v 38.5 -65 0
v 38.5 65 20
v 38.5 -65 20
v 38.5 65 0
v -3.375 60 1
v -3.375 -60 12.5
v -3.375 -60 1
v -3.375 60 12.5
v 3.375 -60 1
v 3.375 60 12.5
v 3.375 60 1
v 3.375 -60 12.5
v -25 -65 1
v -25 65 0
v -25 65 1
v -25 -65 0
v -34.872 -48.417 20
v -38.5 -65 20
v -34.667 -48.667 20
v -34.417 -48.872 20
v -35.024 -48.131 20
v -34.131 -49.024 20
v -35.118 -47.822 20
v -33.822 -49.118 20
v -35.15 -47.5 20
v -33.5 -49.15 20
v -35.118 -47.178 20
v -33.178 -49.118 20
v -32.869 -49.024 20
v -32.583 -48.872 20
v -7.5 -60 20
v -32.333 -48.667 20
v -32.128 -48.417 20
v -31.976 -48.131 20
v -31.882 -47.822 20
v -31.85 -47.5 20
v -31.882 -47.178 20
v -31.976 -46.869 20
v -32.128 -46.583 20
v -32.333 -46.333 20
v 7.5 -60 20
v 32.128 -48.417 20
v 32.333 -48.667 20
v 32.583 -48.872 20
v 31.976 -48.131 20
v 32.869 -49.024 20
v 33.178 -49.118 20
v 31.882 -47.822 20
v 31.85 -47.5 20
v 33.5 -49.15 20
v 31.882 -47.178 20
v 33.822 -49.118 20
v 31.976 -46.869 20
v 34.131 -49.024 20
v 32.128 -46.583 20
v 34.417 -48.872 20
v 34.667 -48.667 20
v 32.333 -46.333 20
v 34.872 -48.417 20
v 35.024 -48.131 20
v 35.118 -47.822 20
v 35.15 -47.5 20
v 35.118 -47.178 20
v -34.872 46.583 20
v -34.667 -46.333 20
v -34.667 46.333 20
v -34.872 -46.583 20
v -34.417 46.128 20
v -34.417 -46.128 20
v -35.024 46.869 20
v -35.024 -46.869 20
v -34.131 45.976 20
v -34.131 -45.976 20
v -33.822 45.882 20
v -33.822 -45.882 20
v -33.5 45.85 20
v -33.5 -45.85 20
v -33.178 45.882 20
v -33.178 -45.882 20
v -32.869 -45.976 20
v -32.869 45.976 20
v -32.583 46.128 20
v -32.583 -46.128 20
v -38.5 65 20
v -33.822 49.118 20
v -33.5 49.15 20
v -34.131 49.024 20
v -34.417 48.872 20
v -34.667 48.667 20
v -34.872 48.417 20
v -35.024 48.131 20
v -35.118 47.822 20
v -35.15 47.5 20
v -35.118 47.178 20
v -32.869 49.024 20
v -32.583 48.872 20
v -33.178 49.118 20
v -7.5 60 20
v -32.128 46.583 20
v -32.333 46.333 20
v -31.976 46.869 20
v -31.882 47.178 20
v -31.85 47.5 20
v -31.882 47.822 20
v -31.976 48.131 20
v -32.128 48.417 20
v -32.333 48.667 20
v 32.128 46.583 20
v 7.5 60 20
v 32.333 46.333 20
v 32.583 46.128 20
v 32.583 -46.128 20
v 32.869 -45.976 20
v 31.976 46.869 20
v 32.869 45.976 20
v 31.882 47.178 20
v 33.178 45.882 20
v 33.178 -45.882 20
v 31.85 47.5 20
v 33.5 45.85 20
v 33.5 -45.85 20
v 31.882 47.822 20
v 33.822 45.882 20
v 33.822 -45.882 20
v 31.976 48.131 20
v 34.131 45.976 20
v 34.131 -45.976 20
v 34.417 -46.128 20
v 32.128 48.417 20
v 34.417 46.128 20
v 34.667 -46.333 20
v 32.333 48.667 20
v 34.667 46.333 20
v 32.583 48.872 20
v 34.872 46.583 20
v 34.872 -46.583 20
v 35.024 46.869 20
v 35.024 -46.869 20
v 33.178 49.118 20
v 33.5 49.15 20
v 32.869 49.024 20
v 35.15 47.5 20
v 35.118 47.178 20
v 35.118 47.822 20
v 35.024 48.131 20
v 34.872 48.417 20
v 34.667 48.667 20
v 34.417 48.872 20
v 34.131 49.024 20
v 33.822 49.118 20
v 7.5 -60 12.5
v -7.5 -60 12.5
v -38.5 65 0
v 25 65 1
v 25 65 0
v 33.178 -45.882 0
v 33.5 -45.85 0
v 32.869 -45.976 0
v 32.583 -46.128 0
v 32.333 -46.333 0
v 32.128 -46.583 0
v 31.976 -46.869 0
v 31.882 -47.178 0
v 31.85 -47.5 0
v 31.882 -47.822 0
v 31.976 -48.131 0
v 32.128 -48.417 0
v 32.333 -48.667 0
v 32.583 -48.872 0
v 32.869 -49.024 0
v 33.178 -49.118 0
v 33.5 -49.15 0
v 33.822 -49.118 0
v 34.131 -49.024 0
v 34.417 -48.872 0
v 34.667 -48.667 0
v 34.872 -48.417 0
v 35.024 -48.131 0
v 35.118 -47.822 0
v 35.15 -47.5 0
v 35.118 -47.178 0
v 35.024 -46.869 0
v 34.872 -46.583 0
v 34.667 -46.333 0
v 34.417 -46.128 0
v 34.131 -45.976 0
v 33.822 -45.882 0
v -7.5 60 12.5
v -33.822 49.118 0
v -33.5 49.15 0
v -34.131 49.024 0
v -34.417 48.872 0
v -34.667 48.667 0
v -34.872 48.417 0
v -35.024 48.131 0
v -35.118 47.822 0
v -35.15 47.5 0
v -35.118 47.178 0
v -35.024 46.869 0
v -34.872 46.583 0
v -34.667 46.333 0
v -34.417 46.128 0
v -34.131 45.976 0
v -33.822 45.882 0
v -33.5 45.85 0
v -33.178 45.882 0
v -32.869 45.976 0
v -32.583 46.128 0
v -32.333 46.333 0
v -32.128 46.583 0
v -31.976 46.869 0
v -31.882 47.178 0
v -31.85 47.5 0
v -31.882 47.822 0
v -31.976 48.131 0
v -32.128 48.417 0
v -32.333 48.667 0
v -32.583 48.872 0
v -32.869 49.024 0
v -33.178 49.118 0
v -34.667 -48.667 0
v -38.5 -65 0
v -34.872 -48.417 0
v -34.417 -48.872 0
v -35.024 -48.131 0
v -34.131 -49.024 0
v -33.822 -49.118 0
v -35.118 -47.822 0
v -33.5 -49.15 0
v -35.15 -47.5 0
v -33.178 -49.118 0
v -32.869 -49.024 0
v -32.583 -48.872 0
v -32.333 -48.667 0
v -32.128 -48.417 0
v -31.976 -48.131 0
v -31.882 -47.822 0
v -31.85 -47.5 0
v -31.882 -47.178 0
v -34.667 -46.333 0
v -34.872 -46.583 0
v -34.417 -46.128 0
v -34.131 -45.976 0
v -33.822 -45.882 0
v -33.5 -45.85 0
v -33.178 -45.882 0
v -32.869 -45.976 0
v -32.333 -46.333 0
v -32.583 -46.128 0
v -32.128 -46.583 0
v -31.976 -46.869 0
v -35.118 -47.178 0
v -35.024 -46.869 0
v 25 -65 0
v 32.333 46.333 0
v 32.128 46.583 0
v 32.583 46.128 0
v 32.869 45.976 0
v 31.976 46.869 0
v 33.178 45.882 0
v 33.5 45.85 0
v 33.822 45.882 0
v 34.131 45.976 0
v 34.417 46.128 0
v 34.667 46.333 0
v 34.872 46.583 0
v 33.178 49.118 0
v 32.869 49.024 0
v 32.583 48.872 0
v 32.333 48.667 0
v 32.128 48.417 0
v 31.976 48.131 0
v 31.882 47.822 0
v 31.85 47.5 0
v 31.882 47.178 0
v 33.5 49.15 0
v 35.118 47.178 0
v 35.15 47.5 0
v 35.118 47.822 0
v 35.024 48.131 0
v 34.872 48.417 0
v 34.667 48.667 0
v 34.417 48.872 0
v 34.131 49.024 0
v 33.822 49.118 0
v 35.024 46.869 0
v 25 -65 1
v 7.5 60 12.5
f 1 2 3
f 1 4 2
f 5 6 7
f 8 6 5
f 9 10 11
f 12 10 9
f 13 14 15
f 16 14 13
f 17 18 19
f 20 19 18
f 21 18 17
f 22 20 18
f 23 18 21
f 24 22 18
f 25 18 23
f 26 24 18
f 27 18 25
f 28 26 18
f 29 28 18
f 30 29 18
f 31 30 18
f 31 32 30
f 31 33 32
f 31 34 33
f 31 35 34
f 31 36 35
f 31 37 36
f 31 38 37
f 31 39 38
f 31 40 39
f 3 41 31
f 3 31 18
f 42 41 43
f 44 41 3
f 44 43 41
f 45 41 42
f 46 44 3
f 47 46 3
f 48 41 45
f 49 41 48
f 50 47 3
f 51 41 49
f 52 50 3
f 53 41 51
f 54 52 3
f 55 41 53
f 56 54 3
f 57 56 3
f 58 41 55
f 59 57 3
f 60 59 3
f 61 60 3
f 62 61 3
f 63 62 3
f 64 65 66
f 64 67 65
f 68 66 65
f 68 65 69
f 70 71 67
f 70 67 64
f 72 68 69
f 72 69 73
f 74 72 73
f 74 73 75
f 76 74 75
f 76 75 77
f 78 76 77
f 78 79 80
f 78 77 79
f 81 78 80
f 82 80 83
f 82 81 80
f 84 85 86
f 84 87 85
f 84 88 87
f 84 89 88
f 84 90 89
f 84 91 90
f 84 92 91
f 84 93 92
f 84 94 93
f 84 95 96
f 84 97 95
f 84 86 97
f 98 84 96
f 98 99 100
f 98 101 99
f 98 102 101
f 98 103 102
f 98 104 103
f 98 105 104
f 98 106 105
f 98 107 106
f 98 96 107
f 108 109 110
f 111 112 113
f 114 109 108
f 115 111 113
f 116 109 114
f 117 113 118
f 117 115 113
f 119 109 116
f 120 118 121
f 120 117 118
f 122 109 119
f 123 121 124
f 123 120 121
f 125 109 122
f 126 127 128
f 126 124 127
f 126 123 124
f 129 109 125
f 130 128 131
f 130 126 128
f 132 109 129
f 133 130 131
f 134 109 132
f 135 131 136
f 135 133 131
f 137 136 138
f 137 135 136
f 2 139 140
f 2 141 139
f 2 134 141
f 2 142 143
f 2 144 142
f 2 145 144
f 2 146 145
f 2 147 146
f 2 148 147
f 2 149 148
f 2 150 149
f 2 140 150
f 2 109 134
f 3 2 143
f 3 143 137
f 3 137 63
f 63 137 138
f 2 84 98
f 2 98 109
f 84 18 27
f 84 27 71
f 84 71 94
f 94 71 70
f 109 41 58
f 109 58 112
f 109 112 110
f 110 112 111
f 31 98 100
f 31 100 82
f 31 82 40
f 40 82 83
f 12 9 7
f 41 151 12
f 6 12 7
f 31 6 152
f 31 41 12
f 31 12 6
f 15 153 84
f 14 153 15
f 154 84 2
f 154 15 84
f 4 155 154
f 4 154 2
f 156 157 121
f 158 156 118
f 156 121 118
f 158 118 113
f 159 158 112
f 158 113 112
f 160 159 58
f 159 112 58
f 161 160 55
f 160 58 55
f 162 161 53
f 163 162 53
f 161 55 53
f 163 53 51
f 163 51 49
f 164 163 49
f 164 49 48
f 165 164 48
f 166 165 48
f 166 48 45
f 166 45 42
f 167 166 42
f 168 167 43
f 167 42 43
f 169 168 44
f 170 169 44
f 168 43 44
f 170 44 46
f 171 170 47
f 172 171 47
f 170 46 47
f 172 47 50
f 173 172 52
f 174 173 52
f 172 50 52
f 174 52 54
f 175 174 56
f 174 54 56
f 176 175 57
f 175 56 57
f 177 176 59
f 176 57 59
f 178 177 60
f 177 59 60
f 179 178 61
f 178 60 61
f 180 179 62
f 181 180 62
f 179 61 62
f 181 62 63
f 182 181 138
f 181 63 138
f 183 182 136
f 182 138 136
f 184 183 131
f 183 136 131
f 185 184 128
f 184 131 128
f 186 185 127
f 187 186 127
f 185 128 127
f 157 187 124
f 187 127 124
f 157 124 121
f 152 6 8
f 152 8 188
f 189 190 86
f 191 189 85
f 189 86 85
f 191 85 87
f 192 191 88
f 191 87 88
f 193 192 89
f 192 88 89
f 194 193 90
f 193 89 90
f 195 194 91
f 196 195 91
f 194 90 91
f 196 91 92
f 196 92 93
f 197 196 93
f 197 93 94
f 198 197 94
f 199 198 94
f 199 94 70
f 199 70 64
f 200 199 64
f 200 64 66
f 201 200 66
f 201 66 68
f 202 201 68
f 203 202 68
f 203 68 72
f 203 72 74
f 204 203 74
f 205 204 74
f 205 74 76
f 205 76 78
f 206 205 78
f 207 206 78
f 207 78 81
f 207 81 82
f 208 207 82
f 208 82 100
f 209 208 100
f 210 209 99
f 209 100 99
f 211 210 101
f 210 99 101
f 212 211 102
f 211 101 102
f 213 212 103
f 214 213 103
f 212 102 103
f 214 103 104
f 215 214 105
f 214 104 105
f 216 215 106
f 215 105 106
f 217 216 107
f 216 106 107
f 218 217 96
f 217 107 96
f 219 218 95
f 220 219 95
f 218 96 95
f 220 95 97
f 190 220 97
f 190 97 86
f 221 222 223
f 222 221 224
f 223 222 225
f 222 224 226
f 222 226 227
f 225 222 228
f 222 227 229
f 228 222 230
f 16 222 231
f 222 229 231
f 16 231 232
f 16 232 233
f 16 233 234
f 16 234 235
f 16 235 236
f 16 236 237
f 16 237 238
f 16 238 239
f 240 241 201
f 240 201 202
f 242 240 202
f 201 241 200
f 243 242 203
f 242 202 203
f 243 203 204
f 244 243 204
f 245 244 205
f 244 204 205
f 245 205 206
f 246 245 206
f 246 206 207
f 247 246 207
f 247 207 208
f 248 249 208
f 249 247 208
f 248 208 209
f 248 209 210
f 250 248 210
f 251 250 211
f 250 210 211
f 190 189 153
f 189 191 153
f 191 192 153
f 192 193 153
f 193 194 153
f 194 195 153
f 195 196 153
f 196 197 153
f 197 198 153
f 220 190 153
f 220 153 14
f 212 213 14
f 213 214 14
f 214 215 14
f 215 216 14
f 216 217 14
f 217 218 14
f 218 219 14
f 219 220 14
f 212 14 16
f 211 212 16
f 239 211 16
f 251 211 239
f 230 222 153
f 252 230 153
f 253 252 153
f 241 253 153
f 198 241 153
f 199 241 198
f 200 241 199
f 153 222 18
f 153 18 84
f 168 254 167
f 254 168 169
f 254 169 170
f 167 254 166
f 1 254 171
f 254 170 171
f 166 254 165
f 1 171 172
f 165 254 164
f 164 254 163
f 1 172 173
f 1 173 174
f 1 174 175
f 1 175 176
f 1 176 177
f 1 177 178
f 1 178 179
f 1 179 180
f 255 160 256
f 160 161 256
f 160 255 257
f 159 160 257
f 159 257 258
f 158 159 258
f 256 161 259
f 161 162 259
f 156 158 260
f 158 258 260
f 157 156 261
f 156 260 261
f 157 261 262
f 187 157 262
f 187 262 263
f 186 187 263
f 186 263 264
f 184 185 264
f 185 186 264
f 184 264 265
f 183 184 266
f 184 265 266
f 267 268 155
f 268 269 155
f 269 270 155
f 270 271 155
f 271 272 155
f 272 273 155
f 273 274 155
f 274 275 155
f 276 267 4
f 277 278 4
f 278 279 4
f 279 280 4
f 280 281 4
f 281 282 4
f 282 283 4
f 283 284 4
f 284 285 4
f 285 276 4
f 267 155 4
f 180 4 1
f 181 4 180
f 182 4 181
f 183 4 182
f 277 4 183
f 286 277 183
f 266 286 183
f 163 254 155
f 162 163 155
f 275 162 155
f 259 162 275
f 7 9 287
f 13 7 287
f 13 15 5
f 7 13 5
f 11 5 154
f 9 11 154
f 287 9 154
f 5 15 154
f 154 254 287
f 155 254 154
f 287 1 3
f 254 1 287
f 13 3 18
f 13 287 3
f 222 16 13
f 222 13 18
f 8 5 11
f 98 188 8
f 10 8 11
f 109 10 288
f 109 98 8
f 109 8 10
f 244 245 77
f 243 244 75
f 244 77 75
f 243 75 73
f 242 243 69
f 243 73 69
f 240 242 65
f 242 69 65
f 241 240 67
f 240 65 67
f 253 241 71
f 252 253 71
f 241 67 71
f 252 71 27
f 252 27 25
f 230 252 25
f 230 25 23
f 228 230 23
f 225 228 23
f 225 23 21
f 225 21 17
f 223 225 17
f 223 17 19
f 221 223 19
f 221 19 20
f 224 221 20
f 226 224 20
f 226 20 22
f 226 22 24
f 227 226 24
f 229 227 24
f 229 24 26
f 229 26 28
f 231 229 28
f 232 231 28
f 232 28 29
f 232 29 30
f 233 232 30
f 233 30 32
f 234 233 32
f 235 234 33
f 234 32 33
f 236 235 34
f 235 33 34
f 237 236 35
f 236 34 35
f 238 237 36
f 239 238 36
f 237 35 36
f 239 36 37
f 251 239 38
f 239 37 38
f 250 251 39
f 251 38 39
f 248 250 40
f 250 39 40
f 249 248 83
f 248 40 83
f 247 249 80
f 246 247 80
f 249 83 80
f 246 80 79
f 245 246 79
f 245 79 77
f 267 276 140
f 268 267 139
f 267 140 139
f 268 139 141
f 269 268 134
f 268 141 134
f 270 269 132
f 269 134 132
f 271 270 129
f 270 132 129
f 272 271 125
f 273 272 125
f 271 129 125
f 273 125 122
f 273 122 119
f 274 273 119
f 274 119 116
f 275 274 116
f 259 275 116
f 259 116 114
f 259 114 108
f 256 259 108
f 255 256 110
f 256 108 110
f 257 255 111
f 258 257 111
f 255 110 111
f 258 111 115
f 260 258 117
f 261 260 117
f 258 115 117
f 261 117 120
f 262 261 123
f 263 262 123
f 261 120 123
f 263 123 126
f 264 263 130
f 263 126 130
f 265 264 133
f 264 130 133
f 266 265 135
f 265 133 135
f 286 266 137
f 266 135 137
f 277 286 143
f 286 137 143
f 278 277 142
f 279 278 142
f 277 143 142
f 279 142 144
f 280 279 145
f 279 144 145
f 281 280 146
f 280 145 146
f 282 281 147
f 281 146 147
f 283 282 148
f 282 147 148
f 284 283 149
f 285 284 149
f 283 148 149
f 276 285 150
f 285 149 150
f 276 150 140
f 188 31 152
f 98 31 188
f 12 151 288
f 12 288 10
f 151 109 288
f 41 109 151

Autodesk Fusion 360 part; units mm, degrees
sketch "Sketch1" plane through (0, 0, 0) normal (0, 0, 1) x (1, 0, 0)
  line L0 (-38.5, 65) -> (38.5, 65)
  line L1 (38.5, 65) -> (38.5, -65)
  line L2 (38.5, -65) -> (-38.5, -65)
  line L3 (-38.5, -65) -> (-38.5, 65)
  line L4 (0, 65) -> (0, 0)
  line L5 (0, 0) -> (38.5, 0)
  line L6 (-33.5, -47.5) -> (-33.5, -65)
  line L7 (-33.5, -47.5) -> (-38.5, -47.5)
  line L8 (-33.5, 47.5) -> (-33.5, 65)
  line L9 (-33.5, 47.5) -> (-38.5, 47.5)
  line L10 (33.5, 47.5) -> (38.5, 47.5)
  line L11 (33.5, 47.5) -> (33.5, 65)
  line L12 (33.5, -47.5) -> (38.5, -47.5)
  line L13 (33.5, -47.5) -> (33.5, -65)
  point P0 (-33.5, 47.5)
  point P1 (33.5, 47.5)
  point P2 (33.5, -47.5)
  point P3 (-33.5, -47.5)
  dimension "d2" = 77
  dimension "d3" = 130
  dimension "d21" = 5
  dimension "d22" = 17.5
extrude "Extrude1" add sketch "Sketch1" along normal blind 20
hole "Hole1" at (-33.5, 47.5, 0) at (33.5, 47.5, 0) at (-33.5, -47.5, 0) at (33.5, -47.5, 0) direction (0, 0, 1) diameter 3.3 end through all
sketch "Sketch2" plane through (0, 0, 20) normal (0, 0, 1) x (-1, 0, 0)
  circle A0 centre (33.5, 47.5) radius 1.65
  circle A1 centre (33.5, -47.5) radius 1.65
  circle A2 centre (-33.5, -47.5) radius 1.65
  circle A3 centre (-33.5, 47.5) radius 1.65
  line L0 (38.5, 65) -> (-38.5, 65)
  line L1 (-38.5, 65) -> (-38.5, -65)
  line L2 (-38.5, -65) -> (38.5, -65)
  line L3 (38.5, -65) -> (38.5, 65)
  line L4 (0, 0) -> (-7.5, 0)
  line L5 (0, 0) -> (0, -60)
  line L6 (7.5, -60) -> (-7.5, -60)
  line L7 (-7.5, -60) -> (-7.5, 60)
  line L8 (-7.5, 60) -> (7.5, 60)
  line L9 (7.5, 60) -> (7.5, -60)
  dimension "d12" = 15
  dimension "d13" = 120
extrude "Extrude2" cut sketch "Sketch2" against normal blind 7.5 contours L4 L5 L6 L7 | L4 L5 L6 L7 L8 L9
sketch "Sketch3" plane through (0, 0, 12.5) normal (0, 0, 1) x (-1, 0, 0)
  line L0 (7.5, 60) -> (-7.5, 60)
  line L1 (-7.5, 60) -> (-7.5, -60)
  line L2 (-7.5, -60) -> (7.5, -60)
  line L3 (7.5, -60) -> (7.5, 60)
  line L4 (0, 0) -> (0, -60)
  line L5 (0, 0) -> (-3.375, 0)
  line L6 (3.375, -60) -> (-3.375, -60)
  line L7 (-3.375, -60) -> (-3.375, 60)
  line L8 (-3.375, 60) -> (3.375, 60)
  line L9 (3.375, 60) -> (3.375, -60)
  dimension "d16" = 120
  dimension "d17" = 6.75
extrude "Extrude3" cut sketch "Sketch3" against normal through all contours L0 L2 L4 L5 L6 L7 L8 L9 | L2 L4 L5 L6 L7
sketch "Sketch4" plane through (0, 0, 0) normal (0, 0, 1) x (1, 0, 0)
  line L0 (0, 0) -> (25, 0)
  line L1 (0, 0) -> (0, -65)
  line L2 (-25, -65) -> (25, -65)
  line L3 (25, -65) -> (25, 65)
  line L4 (25, 65) -> (-25, 65)
  line L5 (-25, 65) -> (-25, -65)
  dimension "d23" = 130
  dimension "d26" = 50
extrude "Extrude5" cut sketch "Sketch4" along normal blind 1
extrude "Extrude4" [suppressed]
